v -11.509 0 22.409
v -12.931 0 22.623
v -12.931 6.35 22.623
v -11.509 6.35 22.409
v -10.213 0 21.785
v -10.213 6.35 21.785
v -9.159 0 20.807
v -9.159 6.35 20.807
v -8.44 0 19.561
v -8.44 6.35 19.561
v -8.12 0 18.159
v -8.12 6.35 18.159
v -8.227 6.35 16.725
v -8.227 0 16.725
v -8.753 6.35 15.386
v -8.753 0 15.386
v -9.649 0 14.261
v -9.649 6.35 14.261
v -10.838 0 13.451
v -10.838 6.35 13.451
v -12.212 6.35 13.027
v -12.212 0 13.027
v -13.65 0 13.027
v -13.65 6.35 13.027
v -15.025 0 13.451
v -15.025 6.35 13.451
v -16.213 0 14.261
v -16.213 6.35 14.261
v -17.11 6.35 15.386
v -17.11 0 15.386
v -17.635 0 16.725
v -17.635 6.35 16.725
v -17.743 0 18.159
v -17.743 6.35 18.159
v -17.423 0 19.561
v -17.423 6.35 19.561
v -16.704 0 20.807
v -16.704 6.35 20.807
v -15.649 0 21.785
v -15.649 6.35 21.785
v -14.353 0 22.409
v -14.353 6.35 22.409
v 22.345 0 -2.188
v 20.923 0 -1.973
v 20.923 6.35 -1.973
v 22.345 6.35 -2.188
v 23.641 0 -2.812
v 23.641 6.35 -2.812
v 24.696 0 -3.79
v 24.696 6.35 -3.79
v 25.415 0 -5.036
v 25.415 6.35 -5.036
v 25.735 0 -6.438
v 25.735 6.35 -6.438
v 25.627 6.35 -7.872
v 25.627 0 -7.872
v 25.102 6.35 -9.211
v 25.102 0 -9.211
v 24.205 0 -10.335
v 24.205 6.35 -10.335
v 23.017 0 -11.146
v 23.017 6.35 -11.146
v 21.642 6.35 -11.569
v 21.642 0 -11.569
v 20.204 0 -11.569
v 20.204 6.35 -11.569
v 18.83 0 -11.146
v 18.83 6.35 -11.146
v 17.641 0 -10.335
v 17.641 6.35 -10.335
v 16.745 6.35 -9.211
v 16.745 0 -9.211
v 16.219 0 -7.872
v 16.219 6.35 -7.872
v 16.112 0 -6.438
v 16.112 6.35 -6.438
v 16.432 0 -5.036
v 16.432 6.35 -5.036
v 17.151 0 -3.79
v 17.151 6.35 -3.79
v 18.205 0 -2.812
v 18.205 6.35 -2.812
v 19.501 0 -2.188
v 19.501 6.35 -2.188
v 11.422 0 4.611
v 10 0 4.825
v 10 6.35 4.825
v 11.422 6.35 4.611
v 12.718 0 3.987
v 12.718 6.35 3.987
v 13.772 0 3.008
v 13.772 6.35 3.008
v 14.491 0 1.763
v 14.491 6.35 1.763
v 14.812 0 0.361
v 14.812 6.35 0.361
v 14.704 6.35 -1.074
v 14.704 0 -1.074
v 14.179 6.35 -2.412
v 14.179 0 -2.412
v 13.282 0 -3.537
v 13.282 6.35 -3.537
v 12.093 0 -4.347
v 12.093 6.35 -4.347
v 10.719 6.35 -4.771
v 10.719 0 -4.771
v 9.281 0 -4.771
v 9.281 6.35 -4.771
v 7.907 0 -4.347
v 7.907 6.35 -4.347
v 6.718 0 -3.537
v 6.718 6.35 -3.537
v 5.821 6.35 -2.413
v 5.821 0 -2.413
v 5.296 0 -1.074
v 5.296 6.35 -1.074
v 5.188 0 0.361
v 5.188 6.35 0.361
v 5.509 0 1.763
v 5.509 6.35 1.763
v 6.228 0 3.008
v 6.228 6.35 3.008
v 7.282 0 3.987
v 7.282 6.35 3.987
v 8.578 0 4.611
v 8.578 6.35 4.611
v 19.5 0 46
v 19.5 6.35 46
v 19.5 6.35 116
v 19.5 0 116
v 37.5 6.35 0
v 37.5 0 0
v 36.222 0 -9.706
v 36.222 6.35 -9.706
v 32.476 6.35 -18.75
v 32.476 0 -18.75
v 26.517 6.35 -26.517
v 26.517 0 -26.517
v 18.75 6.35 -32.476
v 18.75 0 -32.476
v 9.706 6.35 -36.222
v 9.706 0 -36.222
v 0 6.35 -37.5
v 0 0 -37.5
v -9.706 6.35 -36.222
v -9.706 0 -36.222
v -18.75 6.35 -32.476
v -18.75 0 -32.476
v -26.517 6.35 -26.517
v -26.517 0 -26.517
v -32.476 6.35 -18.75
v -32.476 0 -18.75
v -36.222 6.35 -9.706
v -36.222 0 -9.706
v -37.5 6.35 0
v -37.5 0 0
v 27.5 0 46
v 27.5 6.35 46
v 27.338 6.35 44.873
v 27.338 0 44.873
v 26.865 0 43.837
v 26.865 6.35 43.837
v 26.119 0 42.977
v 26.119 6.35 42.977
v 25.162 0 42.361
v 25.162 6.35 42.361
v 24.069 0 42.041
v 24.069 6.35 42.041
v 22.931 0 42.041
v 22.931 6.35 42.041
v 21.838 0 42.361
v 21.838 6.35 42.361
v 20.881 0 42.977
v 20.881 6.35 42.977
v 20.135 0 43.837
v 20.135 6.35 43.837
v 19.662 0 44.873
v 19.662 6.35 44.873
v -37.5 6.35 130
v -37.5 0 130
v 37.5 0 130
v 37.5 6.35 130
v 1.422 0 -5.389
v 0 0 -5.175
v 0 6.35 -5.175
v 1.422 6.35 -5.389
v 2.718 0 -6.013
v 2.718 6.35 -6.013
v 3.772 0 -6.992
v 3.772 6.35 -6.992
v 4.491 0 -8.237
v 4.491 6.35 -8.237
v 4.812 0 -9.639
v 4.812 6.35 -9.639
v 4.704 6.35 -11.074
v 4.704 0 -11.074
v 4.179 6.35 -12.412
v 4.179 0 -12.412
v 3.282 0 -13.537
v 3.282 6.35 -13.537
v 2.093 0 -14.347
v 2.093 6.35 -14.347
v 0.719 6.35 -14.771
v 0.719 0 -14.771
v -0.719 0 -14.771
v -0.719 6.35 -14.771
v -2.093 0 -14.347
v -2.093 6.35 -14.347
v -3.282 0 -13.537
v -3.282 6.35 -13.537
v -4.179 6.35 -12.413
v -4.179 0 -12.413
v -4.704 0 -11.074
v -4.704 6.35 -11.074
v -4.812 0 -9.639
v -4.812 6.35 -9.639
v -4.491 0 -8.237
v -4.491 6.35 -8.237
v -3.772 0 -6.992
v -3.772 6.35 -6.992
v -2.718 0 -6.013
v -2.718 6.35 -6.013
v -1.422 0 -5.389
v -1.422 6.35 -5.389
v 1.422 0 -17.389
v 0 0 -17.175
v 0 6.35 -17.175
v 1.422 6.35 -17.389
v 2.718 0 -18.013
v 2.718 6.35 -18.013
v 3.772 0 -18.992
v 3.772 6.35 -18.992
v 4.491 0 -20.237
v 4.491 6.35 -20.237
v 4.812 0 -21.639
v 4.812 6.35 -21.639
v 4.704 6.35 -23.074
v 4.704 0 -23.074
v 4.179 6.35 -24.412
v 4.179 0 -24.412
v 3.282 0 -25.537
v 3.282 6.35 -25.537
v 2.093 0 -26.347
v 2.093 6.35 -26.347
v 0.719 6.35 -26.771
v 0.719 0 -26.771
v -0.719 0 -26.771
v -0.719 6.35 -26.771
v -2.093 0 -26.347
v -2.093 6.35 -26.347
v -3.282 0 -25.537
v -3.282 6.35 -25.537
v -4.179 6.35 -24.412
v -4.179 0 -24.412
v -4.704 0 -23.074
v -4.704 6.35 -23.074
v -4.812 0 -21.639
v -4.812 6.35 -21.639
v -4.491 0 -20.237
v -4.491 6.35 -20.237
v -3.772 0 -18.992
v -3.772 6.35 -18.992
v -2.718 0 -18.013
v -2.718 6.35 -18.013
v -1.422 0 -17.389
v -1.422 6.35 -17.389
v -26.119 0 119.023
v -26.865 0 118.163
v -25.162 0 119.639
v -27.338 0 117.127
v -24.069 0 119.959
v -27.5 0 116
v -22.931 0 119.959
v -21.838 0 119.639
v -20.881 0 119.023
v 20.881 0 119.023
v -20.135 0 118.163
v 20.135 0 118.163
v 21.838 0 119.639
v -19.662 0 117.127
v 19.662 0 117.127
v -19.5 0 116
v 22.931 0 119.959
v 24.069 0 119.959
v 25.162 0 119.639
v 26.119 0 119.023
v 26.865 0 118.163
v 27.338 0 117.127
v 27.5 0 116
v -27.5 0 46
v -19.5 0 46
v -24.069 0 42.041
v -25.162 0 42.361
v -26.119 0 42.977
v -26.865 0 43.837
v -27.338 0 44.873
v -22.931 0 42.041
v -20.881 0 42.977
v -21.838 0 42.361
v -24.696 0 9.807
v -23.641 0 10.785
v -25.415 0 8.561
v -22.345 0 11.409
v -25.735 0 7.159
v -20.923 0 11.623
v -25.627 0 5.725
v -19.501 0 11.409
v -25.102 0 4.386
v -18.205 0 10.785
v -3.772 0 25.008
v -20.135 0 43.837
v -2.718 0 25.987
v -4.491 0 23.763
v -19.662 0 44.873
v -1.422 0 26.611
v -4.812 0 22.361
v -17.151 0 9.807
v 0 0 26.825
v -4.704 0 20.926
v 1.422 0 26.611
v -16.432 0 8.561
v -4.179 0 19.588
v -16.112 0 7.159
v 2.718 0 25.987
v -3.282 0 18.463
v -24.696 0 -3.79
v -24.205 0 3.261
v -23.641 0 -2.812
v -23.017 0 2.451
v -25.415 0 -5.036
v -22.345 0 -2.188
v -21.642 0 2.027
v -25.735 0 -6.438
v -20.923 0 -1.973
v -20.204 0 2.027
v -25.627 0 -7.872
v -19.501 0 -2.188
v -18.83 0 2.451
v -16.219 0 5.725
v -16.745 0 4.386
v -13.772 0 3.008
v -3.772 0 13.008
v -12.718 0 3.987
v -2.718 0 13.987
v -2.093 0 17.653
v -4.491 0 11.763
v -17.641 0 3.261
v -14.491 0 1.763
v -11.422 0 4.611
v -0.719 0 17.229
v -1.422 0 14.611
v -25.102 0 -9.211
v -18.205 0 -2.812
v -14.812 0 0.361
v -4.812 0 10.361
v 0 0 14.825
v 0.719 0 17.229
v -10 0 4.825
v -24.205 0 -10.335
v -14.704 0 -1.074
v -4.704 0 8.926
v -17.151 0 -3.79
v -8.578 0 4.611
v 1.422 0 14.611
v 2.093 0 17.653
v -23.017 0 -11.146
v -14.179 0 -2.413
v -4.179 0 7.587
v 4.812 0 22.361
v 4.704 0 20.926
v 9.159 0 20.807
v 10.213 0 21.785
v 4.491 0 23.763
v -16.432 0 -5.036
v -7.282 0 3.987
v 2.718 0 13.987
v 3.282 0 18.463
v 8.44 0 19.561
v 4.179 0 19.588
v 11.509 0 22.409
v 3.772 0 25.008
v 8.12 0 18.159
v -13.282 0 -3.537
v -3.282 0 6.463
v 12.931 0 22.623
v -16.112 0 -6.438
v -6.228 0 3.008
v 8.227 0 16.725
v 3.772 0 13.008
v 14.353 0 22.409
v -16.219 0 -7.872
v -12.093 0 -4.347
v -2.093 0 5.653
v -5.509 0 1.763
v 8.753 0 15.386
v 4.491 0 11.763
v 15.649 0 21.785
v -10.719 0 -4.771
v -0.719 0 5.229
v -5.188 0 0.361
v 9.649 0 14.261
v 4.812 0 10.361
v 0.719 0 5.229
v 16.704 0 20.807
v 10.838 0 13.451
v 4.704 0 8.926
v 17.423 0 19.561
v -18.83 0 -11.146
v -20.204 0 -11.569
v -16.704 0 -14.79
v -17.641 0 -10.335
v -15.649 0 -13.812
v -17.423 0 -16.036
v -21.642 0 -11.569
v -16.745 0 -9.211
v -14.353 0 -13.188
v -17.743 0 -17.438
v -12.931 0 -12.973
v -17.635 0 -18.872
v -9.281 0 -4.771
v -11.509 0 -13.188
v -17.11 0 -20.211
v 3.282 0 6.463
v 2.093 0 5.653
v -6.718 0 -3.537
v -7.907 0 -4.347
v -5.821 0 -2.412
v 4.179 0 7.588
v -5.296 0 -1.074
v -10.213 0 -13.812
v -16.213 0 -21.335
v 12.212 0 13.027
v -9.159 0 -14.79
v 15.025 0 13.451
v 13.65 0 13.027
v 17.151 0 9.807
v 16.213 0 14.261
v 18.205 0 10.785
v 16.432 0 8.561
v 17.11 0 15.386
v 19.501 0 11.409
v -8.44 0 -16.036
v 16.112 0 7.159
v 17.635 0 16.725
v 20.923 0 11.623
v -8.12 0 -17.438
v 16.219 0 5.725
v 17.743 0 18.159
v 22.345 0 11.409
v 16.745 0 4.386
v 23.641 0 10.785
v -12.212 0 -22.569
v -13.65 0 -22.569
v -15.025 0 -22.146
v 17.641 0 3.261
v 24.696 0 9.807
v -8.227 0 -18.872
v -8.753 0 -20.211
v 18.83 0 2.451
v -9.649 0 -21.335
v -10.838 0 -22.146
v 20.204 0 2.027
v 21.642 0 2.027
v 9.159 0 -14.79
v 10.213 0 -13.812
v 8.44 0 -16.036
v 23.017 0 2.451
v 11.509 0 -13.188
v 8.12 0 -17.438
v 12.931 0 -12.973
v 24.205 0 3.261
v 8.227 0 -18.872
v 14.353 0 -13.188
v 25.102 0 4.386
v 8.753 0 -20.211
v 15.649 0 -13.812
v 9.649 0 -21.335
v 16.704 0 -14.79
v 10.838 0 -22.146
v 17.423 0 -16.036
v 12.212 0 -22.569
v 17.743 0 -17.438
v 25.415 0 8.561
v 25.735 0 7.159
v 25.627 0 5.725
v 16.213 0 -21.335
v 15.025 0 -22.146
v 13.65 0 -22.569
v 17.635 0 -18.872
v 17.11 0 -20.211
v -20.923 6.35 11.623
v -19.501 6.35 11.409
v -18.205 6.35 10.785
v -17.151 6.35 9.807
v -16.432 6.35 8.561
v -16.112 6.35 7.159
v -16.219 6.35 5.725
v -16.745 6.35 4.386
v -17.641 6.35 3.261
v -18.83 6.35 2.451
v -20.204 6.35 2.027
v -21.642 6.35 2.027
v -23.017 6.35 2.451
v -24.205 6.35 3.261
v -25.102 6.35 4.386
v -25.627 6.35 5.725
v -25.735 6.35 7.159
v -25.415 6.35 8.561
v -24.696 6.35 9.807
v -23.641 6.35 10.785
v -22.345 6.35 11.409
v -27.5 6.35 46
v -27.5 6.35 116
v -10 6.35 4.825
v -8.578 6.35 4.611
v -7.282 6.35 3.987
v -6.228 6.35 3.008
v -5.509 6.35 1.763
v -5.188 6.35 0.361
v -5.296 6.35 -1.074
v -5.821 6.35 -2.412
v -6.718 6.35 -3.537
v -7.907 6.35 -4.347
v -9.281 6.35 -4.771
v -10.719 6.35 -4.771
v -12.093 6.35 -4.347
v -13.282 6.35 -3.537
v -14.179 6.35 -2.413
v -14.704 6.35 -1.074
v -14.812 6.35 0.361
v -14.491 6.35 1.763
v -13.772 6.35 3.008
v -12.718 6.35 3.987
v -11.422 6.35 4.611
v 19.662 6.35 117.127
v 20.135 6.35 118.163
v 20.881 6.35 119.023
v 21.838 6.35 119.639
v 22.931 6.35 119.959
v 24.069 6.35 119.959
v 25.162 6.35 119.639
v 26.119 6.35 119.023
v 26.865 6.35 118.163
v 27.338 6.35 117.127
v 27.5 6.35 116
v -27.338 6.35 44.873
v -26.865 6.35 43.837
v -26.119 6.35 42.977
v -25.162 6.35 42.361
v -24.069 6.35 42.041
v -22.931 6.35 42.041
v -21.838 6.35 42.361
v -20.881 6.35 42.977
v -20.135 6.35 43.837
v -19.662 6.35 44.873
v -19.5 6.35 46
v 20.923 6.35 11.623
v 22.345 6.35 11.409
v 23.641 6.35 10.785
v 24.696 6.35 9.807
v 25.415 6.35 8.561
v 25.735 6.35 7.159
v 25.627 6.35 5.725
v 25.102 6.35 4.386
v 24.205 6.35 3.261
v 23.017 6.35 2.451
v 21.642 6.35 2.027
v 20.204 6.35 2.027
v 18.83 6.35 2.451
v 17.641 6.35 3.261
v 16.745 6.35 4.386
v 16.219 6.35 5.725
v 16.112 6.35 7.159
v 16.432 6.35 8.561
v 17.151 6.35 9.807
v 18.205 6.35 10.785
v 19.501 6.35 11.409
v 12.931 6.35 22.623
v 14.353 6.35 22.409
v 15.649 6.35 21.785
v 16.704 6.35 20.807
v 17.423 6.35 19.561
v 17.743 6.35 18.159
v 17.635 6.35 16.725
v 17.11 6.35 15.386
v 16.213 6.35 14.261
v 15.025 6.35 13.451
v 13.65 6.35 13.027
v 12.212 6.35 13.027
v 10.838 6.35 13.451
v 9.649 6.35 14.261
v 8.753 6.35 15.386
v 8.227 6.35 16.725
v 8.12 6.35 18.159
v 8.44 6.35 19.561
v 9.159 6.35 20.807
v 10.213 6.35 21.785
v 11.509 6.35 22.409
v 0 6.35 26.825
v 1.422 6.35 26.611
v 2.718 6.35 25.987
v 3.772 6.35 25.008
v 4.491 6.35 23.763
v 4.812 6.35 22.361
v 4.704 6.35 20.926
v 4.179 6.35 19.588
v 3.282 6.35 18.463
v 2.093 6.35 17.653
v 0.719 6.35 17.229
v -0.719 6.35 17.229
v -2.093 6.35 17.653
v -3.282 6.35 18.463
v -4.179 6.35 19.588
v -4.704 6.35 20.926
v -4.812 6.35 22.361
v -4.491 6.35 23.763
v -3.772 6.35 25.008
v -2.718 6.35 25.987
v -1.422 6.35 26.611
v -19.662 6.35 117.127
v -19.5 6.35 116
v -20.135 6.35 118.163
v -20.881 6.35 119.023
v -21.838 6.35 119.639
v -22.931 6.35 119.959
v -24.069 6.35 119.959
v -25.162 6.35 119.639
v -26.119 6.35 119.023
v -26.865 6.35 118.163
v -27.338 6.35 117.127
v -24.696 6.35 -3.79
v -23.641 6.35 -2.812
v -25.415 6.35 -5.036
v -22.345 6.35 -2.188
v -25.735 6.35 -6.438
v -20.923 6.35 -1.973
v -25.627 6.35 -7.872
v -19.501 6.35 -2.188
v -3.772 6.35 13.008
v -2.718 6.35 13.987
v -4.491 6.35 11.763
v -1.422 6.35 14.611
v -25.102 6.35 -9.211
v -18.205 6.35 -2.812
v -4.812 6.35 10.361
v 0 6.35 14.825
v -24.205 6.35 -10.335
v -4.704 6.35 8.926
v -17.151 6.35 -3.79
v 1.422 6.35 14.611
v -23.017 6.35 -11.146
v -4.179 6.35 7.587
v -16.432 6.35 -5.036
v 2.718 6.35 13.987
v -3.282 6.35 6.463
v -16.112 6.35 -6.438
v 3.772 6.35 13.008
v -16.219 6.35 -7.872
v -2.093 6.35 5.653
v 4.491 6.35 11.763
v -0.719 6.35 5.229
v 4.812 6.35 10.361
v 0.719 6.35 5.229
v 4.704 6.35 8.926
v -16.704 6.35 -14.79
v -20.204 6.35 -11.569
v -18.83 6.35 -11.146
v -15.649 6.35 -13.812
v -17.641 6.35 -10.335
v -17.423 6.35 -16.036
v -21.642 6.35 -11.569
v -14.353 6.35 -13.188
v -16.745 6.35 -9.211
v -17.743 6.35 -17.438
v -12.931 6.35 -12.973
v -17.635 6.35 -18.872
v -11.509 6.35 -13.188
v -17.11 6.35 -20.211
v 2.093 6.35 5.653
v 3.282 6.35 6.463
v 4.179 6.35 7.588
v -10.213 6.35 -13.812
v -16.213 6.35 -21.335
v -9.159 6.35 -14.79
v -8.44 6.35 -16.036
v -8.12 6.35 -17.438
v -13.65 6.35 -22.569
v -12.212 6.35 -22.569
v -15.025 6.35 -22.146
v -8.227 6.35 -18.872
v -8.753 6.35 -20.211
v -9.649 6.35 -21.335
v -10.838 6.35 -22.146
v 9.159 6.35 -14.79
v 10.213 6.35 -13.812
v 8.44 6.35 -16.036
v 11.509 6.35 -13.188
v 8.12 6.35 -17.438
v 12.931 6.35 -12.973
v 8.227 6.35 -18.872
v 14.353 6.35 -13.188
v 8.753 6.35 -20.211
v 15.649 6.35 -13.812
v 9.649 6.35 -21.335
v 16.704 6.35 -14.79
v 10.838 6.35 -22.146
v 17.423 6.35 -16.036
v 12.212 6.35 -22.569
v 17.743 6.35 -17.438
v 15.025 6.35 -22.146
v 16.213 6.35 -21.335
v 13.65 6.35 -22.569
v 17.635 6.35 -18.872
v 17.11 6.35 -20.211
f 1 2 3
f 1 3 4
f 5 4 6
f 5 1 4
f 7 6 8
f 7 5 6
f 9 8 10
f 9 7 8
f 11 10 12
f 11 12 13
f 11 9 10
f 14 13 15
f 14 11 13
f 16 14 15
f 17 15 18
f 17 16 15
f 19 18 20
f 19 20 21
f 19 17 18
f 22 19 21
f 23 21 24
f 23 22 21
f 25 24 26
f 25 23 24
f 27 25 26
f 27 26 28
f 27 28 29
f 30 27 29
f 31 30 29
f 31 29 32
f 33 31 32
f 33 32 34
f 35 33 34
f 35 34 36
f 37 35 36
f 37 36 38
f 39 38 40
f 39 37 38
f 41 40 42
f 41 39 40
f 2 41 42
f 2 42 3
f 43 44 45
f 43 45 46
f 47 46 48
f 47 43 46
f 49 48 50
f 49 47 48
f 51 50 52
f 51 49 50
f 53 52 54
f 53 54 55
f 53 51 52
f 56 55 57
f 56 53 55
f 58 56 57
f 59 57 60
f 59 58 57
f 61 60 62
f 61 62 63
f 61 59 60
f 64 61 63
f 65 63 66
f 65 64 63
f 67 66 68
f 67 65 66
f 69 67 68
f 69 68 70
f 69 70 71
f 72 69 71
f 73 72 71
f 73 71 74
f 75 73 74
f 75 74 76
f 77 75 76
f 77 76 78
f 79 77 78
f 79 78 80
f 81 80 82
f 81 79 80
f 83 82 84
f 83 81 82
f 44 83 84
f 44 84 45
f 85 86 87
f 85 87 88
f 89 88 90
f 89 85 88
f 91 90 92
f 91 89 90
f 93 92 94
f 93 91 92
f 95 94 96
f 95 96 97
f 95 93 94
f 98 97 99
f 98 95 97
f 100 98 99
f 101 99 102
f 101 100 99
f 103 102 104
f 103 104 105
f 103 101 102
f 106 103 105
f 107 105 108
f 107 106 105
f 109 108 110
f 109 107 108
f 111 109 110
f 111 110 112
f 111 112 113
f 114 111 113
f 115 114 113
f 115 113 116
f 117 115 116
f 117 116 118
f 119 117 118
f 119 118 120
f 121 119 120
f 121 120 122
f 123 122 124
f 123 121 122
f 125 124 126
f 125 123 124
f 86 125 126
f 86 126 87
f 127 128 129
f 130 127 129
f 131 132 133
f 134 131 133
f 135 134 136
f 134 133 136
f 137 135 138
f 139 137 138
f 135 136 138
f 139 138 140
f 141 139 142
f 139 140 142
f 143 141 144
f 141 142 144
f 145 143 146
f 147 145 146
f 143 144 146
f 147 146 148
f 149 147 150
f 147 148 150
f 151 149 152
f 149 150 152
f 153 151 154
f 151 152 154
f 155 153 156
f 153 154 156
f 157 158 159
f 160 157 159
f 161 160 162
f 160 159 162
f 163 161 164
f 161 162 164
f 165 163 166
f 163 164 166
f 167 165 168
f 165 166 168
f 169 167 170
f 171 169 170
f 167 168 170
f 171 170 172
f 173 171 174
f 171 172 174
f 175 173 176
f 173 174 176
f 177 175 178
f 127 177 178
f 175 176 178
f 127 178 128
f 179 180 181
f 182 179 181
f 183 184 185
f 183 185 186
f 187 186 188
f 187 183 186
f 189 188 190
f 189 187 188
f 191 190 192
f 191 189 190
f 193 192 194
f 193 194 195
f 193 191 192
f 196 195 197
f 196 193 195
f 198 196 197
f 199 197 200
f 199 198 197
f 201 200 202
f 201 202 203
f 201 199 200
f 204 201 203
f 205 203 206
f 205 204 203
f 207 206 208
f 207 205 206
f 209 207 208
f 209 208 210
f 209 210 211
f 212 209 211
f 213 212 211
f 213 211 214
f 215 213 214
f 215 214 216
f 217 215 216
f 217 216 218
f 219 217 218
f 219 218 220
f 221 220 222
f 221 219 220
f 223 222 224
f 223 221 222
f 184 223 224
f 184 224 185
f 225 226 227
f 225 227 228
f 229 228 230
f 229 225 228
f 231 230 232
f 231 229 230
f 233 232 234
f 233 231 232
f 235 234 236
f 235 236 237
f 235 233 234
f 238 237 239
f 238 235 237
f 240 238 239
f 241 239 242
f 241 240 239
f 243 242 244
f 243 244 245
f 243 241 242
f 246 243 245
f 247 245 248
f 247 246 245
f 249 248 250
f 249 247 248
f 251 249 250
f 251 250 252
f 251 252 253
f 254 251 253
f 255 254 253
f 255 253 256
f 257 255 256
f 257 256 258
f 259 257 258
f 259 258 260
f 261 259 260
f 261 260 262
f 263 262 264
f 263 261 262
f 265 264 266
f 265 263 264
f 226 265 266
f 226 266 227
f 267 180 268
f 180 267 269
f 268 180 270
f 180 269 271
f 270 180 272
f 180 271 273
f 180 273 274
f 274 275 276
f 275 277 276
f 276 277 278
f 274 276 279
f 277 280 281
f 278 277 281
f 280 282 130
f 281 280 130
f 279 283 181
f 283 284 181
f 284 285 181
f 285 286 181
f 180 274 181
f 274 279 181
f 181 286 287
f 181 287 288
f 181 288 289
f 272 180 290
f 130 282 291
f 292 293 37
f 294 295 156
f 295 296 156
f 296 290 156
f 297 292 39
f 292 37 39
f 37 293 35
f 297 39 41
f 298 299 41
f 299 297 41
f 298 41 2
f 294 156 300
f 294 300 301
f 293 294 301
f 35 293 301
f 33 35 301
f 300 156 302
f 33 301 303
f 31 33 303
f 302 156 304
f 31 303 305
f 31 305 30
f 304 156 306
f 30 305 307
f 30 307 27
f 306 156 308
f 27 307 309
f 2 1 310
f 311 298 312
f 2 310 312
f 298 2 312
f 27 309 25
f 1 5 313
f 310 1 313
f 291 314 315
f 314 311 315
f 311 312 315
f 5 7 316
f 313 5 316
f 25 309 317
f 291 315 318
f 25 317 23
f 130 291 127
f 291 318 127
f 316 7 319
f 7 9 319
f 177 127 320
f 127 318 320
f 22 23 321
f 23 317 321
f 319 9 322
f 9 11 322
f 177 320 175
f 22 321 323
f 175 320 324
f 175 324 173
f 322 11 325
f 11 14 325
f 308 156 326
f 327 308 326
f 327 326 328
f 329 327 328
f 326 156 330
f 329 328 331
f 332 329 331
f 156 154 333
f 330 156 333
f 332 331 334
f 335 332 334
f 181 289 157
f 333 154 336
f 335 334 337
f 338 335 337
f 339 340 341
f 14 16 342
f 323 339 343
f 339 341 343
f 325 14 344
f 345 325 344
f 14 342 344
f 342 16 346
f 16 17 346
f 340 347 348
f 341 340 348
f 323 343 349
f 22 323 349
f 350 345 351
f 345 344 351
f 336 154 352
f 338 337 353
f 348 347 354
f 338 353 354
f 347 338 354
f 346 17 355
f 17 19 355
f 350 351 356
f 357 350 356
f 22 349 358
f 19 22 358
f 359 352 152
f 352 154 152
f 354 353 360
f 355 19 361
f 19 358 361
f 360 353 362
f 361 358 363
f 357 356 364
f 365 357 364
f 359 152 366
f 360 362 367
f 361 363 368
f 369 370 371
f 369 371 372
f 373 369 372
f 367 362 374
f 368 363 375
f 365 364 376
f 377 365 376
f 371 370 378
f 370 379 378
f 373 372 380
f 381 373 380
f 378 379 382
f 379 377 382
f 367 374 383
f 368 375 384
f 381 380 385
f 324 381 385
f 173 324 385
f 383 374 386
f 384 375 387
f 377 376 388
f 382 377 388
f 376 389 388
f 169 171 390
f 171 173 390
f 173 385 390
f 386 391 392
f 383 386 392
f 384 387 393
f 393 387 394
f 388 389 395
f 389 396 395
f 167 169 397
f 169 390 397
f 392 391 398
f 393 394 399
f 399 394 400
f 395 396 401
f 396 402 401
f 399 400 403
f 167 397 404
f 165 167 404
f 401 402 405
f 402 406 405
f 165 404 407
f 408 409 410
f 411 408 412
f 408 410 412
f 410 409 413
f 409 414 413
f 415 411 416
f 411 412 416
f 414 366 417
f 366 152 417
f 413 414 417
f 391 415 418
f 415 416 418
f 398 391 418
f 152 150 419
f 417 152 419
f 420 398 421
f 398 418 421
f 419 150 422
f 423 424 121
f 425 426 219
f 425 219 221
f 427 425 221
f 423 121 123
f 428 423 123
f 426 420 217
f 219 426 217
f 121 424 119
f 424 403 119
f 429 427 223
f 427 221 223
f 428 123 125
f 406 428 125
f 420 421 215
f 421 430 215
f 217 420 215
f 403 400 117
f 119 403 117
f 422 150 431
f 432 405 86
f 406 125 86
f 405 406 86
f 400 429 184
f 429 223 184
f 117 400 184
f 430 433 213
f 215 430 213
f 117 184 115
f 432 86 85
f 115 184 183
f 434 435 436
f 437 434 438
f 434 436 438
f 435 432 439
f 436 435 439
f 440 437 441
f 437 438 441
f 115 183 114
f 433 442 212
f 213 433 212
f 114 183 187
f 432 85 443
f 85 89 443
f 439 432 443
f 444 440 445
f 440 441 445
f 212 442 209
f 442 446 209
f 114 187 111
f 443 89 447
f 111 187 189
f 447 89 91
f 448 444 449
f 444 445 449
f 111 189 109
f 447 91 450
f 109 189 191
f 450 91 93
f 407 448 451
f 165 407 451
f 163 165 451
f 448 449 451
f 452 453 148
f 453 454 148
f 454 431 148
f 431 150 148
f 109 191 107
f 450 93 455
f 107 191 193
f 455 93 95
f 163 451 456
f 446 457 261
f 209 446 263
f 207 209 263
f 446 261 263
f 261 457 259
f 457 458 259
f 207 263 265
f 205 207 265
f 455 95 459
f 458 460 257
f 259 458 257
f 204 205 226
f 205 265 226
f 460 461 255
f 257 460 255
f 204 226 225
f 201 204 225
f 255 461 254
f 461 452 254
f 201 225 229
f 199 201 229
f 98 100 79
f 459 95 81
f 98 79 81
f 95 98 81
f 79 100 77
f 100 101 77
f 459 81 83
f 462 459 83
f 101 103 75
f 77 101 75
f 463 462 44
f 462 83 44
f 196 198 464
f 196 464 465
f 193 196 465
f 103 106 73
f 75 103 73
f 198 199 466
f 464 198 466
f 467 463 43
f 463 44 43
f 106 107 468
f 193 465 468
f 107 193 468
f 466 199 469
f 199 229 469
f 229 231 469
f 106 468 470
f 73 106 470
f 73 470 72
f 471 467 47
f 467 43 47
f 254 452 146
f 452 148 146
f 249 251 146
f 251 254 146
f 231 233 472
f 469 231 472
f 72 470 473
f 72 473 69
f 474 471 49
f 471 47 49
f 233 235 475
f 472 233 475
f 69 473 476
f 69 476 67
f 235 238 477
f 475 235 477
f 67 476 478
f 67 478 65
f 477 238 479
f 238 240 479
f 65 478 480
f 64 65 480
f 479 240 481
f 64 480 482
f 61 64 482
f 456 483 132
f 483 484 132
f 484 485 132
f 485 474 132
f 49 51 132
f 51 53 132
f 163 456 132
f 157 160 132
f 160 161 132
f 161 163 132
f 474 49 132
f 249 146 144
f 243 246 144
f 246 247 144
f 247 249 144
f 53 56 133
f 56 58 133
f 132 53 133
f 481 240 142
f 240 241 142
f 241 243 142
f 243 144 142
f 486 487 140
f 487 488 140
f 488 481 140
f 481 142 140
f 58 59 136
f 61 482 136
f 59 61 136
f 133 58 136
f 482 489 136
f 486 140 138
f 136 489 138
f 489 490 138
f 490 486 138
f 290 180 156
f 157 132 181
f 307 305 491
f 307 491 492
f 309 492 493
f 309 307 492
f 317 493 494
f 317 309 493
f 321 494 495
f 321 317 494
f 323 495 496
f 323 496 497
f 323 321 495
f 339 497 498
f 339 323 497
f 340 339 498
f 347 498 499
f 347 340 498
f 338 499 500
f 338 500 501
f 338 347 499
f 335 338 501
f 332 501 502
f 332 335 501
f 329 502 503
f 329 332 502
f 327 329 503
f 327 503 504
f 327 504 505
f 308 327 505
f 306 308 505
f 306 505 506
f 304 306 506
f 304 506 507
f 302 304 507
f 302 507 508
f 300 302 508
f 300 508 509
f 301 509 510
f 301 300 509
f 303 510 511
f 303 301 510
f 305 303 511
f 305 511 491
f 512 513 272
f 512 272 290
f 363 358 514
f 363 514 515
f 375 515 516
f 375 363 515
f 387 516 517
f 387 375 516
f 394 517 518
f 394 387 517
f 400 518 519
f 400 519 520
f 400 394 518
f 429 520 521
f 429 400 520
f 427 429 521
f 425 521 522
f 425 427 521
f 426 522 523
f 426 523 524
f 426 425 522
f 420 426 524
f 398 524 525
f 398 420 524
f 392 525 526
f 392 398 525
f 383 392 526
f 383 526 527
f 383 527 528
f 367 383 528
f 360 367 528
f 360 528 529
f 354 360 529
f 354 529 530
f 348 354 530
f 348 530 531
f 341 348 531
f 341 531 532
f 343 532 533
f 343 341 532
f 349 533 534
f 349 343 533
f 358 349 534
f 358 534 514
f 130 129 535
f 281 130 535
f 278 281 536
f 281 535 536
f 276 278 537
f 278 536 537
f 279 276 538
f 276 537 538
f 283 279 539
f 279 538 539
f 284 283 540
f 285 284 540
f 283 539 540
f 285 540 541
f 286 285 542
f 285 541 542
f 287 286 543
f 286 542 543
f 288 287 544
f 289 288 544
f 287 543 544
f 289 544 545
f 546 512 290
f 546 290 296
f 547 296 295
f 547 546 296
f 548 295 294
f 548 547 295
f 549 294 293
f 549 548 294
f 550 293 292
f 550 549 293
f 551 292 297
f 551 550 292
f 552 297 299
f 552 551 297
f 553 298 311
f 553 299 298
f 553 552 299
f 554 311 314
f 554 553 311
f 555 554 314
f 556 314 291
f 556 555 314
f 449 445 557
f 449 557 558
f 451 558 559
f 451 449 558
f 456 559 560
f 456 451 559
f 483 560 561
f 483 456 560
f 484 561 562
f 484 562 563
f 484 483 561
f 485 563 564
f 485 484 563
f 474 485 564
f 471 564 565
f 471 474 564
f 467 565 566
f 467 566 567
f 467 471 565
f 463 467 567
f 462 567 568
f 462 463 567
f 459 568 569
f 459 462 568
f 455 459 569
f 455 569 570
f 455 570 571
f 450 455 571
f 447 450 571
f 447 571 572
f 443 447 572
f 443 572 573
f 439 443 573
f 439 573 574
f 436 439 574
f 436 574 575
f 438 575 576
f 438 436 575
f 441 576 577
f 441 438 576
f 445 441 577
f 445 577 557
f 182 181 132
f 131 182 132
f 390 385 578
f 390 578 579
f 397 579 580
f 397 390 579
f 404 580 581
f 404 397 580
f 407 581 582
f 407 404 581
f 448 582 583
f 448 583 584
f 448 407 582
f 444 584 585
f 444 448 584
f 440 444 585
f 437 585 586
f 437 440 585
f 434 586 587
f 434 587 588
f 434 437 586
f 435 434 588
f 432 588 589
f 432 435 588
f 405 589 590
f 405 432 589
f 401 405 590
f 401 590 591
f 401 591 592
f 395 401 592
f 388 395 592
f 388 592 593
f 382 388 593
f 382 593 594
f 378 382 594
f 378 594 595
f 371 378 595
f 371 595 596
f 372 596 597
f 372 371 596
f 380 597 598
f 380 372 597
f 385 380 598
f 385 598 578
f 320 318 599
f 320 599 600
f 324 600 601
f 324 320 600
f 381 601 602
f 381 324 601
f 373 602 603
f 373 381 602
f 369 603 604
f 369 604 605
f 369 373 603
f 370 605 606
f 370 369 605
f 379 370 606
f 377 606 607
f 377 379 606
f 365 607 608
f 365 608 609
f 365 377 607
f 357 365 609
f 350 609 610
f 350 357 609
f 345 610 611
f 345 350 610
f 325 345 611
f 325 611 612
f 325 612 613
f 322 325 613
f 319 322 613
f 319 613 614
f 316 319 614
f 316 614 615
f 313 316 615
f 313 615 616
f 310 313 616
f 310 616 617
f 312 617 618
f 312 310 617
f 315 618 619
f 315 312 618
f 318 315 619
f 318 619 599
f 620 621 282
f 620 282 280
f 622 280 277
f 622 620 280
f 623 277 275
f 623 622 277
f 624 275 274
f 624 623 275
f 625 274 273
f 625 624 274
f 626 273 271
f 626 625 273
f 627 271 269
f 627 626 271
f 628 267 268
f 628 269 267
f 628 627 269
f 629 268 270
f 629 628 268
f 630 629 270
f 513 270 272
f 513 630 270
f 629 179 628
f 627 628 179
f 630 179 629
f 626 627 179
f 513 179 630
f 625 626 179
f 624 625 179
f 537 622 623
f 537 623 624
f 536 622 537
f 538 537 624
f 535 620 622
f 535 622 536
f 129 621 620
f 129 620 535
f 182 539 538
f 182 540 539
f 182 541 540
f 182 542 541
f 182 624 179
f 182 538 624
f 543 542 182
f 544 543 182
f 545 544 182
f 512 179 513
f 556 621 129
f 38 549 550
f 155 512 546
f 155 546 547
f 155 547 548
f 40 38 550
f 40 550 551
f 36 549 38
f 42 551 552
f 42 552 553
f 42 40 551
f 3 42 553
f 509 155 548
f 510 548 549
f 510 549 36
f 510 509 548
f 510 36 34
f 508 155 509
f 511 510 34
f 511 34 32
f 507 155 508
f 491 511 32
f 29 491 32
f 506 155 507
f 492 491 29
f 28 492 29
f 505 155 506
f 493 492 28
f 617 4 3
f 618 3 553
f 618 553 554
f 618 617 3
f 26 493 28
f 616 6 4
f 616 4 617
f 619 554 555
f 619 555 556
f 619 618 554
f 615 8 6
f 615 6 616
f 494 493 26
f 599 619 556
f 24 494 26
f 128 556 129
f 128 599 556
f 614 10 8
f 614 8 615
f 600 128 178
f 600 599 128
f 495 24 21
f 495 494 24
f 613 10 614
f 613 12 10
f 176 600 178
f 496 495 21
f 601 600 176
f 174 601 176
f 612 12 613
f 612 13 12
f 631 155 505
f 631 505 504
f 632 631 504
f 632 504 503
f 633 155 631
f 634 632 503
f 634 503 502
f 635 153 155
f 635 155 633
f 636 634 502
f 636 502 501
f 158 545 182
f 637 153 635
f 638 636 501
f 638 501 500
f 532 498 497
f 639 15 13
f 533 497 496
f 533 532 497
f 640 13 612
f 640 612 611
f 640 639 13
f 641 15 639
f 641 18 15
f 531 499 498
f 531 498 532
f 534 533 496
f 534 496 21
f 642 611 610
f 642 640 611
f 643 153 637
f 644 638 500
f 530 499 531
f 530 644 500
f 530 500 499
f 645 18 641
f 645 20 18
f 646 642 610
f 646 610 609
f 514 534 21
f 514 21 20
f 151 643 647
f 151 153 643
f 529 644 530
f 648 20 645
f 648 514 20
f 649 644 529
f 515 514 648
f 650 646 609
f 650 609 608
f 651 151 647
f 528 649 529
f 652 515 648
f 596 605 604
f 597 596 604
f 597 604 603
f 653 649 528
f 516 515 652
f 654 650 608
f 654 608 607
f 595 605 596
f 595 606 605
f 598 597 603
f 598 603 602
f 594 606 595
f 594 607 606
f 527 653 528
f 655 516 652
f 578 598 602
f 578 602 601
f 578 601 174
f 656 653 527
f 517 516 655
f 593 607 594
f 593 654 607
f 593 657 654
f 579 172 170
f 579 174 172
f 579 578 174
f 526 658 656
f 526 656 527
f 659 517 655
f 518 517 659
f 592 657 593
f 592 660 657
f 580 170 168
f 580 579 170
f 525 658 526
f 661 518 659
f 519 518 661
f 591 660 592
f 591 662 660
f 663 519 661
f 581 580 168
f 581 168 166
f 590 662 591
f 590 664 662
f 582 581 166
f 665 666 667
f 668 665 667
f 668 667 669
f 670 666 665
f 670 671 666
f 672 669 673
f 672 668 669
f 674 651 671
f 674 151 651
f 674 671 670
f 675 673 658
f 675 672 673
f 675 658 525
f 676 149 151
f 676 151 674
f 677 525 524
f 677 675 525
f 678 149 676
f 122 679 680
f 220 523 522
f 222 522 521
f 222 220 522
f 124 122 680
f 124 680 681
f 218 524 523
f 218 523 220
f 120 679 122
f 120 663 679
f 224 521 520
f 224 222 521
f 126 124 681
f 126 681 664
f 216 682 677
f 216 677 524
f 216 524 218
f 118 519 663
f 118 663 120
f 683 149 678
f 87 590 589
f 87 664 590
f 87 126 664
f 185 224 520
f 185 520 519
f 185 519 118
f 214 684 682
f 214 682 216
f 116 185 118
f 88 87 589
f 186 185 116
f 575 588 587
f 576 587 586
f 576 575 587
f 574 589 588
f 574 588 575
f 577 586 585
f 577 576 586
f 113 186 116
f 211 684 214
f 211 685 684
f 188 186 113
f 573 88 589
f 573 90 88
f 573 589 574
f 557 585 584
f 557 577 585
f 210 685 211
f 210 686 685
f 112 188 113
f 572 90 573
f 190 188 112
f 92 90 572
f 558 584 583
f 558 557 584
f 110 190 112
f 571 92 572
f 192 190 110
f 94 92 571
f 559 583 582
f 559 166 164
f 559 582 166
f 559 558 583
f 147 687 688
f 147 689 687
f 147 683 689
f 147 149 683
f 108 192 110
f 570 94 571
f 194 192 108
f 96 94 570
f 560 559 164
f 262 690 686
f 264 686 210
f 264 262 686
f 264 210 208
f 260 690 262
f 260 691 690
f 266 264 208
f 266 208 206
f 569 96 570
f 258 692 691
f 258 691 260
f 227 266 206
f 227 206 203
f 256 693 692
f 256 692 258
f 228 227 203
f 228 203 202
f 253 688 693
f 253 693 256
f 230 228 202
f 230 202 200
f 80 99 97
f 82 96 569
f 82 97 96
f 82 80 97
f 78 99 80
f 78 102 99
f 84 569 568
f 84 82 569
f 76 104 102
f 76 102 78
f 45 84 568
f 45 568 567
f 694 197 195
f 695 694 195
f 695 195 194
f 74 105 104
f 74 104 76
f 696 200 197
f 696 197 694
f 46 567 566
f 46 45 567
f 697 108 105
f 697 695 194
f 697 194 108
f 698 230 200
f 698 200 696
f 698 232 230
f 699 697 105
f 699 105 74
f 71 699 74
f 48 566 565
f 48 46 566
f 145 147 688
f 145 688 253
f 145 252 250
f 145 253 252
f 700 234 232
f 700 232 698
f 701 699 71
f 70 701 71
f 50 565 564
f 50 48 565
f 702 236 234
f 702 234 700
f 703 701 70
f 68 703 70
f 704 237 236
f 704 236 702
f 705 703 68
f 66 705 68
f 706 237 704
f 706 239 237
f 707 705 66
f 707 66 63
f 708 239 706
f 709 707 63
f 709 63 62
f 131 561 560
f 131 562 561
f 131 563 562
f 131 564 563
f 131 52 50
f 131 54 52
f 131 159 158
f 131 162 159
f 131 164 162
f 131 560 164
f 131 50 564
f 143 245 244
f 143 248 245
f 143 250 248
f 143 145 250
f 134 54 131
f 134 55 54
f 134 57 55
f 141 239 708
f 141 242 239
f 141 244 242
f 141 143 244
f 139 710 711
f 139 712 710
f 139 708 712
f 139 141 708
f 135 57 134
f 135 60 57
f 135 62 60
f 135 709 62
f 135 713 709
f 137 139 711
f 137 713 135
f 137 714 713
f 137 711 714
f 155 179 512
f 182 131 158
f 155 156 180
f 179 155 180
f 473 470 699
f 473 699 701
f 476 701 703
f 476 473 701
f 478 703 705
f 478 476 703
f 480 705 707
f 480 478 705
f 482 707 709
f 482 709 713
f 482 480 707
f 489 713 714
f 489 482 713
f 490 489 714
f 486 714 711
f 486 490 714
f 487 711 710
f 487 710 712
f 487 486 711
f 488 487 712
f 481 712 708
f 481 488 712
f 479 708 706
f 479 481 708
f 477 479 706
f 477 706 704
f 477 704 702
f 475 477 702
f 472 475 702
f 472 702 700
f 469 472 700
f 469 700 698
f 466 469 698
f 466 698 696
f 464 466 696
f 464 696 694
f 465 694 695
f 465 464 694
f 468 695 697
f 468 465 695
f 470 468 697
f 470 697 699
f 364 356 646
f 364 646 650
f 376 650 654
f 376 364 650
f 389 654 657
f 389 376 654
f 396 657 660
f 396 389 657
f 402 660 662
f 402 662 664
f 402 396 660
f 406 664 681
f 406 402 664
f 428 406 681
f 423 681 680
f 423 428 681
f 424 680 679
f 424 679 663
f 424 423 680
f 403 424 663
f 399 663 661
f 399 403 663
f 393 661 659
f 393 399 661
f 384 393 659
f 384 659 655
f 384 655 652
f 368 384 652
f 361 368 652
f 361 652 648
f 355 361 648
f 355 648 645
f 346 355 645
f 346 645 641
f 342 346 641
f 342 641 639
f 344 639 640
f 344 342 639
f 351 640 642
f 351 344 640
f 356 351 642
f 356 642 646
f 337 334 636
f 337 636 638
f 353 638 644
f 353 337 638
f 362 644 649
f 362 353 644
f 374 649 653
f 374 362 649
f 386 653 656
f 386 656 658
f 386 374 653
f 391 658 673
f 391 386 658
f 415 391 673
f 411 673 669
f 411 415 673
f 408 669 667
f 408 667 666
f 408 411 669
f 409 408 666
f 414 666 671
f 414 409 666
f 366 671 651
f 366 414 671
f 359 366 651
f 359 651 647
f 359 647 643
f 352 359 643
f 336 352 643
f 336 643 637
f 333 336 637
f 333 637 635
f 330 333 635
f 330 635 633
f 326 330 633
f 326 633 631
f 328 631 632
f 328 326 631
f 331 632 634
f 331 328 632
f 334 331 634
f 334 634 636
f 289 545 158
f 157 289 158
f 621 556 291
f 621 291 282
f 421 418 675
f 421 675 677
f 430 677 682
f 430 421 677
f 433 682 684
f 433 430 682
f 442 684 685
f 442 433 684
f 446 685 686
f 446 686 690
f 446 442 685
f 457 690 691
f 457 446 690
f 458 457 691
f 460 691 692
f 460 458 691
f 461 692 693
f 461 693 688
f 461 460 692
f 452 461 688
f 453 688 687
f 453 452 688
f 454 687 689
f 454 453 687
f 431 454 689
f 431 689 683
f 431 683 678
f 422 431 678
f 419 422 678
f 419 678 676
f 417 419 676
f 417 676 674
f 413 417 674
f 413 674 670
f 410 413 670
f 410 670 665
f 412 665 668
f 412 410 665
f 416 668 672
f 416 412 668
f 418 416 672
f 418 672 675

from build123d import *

# Parameters (mm, degrees)
SKETCH1_R           = 4.825
BOSS_EXTRUDE1_DEPTH = 6.35
CUT_EXTRUDE1_DEPTH  = 136.449520117


with BuildPart() as part:
    # Sketch1 → Boss-Extrude1 (new body)
    with BuildSketch(Plane(origin=(0, 0, 0), x_dir=(1, 0, 0), z_dir=(0, 1, 0))):
        with BuildLine():
            Line((-37.5, 0), (-37.5, -130))
            Line((-37.5, -130), (37.5, -130))
            Line((37.5, -130), (37.5, 0))
            ThreePointArc((37.5, 0), (0, 37.5), (-37.5, 0))
        make_face()
        with Locations(Location((0, 22, 0), (0, 0, 270))):
            Circle(SKETCH1_R, mode=Mode.SUBTRACT)
        with Locations(Location((0, 10, 0), (0, 0, 270))):
            Circle(SKETCH1_R, mode=Mode.SUBTRACT)
        with Locations(Location((12.93127555, 17.798373876, 0), (0, 0, 270))):
            Circle(SKETCH1_R, mode=Mode.SUBTRACT)
        with Locations(Location((20.923243358, 6.798373876, 0), (0, 0, 270))):
            Circle(SKETCH1_R, mode=Mode.SUBTRACT)
        with Locations(Location((20.923243358, -6.798373876, 0), (0, 0, 270))):
            Circle(SKETCH1_R, mode=Mode.SUBTRACT)
        with Locations(Location((12.93127555, -17.798373876, 0), (0, 0, 270))):
            Circle(SKETCH1_R, mode=Mode.SUBTRACT)
        with Locations(Location((0, -22, 0), (0, 0, 270))):
            Circle(SKETCH1_R, mode=Mode.SUBTRACT)
        with Locations(Location((-12.93127555, -17.798373876, 0), (0, 0, 270))):
            Circle(SKETCH1_R, mode=Mode.SUBTRACT)
        with Locations(Location((-20.923243358, -6.798373876, 0), (0, 0, 270))):
            Circle(SKETCH1_R, mode=Mode.SUBTRACT)
        with Locations(Location((-20.923243358, 6.798373876, 0), (0, 0, 270))):
            Circle(SKETCH1_R, mode=Mode.SUBTRACT)
        with Locations(Location((-12.93127555, 17.798373876, 0), (0, 0, 270))):
            Circle(SKETCH1_R, mode=Mode.SUBTRACT)
        with Locations(Location((10, 0, 0), (0, 0, 270))):
            Circle(SKETCH1_R, mode=Mode.SUBTRACT)
        with Locations(Location((0, -10, 0), (0, 0, 270))):
            Circle(SKETCH1_R, mode=Mode.SUBTRACT)
        with Locations(Location((-10, 0, 0), (0, 0, 270))):
            Circle(SKETCH1_R, mode=Mode.SUBTRACT)
    extrude(amount=BOSS_EXTRUDE1_DEPTH)

    # Sketch2 → Cut-Extrude1 (cut, through all)
    with BuildSketch(Plane(origin=(0, 6.35, 0), x_dir=(1, 0, 0), z_dir=(0, 1, 0))):
        with BuildLine():
            Line((-27.5, -116), (-27.5, -46))
            ThreePointArc((-27.5, -46), (-23.5, -42), (-19.5, -46))
            Line((-19.5, -46), (-19.5, -116))
            ThreePointArc((-19.5, -116), (-23.5, -120), (-27.5, -116))
        make_face()
    cut_extrude1 = extrude(amount=-CUT_EXTRUDE1_DEPTH, mode=Mode.SUBTRACT)

    # Mirror1: Cut-Extrude1 across plane
    add(cut_extrude1.mirror(Plane(origin=(0, 0, 0), x_dir=(0, 0, 1), z_dir=(1, 0, 0))), mode=Mode.SUBTRACT)


solid = part.part
